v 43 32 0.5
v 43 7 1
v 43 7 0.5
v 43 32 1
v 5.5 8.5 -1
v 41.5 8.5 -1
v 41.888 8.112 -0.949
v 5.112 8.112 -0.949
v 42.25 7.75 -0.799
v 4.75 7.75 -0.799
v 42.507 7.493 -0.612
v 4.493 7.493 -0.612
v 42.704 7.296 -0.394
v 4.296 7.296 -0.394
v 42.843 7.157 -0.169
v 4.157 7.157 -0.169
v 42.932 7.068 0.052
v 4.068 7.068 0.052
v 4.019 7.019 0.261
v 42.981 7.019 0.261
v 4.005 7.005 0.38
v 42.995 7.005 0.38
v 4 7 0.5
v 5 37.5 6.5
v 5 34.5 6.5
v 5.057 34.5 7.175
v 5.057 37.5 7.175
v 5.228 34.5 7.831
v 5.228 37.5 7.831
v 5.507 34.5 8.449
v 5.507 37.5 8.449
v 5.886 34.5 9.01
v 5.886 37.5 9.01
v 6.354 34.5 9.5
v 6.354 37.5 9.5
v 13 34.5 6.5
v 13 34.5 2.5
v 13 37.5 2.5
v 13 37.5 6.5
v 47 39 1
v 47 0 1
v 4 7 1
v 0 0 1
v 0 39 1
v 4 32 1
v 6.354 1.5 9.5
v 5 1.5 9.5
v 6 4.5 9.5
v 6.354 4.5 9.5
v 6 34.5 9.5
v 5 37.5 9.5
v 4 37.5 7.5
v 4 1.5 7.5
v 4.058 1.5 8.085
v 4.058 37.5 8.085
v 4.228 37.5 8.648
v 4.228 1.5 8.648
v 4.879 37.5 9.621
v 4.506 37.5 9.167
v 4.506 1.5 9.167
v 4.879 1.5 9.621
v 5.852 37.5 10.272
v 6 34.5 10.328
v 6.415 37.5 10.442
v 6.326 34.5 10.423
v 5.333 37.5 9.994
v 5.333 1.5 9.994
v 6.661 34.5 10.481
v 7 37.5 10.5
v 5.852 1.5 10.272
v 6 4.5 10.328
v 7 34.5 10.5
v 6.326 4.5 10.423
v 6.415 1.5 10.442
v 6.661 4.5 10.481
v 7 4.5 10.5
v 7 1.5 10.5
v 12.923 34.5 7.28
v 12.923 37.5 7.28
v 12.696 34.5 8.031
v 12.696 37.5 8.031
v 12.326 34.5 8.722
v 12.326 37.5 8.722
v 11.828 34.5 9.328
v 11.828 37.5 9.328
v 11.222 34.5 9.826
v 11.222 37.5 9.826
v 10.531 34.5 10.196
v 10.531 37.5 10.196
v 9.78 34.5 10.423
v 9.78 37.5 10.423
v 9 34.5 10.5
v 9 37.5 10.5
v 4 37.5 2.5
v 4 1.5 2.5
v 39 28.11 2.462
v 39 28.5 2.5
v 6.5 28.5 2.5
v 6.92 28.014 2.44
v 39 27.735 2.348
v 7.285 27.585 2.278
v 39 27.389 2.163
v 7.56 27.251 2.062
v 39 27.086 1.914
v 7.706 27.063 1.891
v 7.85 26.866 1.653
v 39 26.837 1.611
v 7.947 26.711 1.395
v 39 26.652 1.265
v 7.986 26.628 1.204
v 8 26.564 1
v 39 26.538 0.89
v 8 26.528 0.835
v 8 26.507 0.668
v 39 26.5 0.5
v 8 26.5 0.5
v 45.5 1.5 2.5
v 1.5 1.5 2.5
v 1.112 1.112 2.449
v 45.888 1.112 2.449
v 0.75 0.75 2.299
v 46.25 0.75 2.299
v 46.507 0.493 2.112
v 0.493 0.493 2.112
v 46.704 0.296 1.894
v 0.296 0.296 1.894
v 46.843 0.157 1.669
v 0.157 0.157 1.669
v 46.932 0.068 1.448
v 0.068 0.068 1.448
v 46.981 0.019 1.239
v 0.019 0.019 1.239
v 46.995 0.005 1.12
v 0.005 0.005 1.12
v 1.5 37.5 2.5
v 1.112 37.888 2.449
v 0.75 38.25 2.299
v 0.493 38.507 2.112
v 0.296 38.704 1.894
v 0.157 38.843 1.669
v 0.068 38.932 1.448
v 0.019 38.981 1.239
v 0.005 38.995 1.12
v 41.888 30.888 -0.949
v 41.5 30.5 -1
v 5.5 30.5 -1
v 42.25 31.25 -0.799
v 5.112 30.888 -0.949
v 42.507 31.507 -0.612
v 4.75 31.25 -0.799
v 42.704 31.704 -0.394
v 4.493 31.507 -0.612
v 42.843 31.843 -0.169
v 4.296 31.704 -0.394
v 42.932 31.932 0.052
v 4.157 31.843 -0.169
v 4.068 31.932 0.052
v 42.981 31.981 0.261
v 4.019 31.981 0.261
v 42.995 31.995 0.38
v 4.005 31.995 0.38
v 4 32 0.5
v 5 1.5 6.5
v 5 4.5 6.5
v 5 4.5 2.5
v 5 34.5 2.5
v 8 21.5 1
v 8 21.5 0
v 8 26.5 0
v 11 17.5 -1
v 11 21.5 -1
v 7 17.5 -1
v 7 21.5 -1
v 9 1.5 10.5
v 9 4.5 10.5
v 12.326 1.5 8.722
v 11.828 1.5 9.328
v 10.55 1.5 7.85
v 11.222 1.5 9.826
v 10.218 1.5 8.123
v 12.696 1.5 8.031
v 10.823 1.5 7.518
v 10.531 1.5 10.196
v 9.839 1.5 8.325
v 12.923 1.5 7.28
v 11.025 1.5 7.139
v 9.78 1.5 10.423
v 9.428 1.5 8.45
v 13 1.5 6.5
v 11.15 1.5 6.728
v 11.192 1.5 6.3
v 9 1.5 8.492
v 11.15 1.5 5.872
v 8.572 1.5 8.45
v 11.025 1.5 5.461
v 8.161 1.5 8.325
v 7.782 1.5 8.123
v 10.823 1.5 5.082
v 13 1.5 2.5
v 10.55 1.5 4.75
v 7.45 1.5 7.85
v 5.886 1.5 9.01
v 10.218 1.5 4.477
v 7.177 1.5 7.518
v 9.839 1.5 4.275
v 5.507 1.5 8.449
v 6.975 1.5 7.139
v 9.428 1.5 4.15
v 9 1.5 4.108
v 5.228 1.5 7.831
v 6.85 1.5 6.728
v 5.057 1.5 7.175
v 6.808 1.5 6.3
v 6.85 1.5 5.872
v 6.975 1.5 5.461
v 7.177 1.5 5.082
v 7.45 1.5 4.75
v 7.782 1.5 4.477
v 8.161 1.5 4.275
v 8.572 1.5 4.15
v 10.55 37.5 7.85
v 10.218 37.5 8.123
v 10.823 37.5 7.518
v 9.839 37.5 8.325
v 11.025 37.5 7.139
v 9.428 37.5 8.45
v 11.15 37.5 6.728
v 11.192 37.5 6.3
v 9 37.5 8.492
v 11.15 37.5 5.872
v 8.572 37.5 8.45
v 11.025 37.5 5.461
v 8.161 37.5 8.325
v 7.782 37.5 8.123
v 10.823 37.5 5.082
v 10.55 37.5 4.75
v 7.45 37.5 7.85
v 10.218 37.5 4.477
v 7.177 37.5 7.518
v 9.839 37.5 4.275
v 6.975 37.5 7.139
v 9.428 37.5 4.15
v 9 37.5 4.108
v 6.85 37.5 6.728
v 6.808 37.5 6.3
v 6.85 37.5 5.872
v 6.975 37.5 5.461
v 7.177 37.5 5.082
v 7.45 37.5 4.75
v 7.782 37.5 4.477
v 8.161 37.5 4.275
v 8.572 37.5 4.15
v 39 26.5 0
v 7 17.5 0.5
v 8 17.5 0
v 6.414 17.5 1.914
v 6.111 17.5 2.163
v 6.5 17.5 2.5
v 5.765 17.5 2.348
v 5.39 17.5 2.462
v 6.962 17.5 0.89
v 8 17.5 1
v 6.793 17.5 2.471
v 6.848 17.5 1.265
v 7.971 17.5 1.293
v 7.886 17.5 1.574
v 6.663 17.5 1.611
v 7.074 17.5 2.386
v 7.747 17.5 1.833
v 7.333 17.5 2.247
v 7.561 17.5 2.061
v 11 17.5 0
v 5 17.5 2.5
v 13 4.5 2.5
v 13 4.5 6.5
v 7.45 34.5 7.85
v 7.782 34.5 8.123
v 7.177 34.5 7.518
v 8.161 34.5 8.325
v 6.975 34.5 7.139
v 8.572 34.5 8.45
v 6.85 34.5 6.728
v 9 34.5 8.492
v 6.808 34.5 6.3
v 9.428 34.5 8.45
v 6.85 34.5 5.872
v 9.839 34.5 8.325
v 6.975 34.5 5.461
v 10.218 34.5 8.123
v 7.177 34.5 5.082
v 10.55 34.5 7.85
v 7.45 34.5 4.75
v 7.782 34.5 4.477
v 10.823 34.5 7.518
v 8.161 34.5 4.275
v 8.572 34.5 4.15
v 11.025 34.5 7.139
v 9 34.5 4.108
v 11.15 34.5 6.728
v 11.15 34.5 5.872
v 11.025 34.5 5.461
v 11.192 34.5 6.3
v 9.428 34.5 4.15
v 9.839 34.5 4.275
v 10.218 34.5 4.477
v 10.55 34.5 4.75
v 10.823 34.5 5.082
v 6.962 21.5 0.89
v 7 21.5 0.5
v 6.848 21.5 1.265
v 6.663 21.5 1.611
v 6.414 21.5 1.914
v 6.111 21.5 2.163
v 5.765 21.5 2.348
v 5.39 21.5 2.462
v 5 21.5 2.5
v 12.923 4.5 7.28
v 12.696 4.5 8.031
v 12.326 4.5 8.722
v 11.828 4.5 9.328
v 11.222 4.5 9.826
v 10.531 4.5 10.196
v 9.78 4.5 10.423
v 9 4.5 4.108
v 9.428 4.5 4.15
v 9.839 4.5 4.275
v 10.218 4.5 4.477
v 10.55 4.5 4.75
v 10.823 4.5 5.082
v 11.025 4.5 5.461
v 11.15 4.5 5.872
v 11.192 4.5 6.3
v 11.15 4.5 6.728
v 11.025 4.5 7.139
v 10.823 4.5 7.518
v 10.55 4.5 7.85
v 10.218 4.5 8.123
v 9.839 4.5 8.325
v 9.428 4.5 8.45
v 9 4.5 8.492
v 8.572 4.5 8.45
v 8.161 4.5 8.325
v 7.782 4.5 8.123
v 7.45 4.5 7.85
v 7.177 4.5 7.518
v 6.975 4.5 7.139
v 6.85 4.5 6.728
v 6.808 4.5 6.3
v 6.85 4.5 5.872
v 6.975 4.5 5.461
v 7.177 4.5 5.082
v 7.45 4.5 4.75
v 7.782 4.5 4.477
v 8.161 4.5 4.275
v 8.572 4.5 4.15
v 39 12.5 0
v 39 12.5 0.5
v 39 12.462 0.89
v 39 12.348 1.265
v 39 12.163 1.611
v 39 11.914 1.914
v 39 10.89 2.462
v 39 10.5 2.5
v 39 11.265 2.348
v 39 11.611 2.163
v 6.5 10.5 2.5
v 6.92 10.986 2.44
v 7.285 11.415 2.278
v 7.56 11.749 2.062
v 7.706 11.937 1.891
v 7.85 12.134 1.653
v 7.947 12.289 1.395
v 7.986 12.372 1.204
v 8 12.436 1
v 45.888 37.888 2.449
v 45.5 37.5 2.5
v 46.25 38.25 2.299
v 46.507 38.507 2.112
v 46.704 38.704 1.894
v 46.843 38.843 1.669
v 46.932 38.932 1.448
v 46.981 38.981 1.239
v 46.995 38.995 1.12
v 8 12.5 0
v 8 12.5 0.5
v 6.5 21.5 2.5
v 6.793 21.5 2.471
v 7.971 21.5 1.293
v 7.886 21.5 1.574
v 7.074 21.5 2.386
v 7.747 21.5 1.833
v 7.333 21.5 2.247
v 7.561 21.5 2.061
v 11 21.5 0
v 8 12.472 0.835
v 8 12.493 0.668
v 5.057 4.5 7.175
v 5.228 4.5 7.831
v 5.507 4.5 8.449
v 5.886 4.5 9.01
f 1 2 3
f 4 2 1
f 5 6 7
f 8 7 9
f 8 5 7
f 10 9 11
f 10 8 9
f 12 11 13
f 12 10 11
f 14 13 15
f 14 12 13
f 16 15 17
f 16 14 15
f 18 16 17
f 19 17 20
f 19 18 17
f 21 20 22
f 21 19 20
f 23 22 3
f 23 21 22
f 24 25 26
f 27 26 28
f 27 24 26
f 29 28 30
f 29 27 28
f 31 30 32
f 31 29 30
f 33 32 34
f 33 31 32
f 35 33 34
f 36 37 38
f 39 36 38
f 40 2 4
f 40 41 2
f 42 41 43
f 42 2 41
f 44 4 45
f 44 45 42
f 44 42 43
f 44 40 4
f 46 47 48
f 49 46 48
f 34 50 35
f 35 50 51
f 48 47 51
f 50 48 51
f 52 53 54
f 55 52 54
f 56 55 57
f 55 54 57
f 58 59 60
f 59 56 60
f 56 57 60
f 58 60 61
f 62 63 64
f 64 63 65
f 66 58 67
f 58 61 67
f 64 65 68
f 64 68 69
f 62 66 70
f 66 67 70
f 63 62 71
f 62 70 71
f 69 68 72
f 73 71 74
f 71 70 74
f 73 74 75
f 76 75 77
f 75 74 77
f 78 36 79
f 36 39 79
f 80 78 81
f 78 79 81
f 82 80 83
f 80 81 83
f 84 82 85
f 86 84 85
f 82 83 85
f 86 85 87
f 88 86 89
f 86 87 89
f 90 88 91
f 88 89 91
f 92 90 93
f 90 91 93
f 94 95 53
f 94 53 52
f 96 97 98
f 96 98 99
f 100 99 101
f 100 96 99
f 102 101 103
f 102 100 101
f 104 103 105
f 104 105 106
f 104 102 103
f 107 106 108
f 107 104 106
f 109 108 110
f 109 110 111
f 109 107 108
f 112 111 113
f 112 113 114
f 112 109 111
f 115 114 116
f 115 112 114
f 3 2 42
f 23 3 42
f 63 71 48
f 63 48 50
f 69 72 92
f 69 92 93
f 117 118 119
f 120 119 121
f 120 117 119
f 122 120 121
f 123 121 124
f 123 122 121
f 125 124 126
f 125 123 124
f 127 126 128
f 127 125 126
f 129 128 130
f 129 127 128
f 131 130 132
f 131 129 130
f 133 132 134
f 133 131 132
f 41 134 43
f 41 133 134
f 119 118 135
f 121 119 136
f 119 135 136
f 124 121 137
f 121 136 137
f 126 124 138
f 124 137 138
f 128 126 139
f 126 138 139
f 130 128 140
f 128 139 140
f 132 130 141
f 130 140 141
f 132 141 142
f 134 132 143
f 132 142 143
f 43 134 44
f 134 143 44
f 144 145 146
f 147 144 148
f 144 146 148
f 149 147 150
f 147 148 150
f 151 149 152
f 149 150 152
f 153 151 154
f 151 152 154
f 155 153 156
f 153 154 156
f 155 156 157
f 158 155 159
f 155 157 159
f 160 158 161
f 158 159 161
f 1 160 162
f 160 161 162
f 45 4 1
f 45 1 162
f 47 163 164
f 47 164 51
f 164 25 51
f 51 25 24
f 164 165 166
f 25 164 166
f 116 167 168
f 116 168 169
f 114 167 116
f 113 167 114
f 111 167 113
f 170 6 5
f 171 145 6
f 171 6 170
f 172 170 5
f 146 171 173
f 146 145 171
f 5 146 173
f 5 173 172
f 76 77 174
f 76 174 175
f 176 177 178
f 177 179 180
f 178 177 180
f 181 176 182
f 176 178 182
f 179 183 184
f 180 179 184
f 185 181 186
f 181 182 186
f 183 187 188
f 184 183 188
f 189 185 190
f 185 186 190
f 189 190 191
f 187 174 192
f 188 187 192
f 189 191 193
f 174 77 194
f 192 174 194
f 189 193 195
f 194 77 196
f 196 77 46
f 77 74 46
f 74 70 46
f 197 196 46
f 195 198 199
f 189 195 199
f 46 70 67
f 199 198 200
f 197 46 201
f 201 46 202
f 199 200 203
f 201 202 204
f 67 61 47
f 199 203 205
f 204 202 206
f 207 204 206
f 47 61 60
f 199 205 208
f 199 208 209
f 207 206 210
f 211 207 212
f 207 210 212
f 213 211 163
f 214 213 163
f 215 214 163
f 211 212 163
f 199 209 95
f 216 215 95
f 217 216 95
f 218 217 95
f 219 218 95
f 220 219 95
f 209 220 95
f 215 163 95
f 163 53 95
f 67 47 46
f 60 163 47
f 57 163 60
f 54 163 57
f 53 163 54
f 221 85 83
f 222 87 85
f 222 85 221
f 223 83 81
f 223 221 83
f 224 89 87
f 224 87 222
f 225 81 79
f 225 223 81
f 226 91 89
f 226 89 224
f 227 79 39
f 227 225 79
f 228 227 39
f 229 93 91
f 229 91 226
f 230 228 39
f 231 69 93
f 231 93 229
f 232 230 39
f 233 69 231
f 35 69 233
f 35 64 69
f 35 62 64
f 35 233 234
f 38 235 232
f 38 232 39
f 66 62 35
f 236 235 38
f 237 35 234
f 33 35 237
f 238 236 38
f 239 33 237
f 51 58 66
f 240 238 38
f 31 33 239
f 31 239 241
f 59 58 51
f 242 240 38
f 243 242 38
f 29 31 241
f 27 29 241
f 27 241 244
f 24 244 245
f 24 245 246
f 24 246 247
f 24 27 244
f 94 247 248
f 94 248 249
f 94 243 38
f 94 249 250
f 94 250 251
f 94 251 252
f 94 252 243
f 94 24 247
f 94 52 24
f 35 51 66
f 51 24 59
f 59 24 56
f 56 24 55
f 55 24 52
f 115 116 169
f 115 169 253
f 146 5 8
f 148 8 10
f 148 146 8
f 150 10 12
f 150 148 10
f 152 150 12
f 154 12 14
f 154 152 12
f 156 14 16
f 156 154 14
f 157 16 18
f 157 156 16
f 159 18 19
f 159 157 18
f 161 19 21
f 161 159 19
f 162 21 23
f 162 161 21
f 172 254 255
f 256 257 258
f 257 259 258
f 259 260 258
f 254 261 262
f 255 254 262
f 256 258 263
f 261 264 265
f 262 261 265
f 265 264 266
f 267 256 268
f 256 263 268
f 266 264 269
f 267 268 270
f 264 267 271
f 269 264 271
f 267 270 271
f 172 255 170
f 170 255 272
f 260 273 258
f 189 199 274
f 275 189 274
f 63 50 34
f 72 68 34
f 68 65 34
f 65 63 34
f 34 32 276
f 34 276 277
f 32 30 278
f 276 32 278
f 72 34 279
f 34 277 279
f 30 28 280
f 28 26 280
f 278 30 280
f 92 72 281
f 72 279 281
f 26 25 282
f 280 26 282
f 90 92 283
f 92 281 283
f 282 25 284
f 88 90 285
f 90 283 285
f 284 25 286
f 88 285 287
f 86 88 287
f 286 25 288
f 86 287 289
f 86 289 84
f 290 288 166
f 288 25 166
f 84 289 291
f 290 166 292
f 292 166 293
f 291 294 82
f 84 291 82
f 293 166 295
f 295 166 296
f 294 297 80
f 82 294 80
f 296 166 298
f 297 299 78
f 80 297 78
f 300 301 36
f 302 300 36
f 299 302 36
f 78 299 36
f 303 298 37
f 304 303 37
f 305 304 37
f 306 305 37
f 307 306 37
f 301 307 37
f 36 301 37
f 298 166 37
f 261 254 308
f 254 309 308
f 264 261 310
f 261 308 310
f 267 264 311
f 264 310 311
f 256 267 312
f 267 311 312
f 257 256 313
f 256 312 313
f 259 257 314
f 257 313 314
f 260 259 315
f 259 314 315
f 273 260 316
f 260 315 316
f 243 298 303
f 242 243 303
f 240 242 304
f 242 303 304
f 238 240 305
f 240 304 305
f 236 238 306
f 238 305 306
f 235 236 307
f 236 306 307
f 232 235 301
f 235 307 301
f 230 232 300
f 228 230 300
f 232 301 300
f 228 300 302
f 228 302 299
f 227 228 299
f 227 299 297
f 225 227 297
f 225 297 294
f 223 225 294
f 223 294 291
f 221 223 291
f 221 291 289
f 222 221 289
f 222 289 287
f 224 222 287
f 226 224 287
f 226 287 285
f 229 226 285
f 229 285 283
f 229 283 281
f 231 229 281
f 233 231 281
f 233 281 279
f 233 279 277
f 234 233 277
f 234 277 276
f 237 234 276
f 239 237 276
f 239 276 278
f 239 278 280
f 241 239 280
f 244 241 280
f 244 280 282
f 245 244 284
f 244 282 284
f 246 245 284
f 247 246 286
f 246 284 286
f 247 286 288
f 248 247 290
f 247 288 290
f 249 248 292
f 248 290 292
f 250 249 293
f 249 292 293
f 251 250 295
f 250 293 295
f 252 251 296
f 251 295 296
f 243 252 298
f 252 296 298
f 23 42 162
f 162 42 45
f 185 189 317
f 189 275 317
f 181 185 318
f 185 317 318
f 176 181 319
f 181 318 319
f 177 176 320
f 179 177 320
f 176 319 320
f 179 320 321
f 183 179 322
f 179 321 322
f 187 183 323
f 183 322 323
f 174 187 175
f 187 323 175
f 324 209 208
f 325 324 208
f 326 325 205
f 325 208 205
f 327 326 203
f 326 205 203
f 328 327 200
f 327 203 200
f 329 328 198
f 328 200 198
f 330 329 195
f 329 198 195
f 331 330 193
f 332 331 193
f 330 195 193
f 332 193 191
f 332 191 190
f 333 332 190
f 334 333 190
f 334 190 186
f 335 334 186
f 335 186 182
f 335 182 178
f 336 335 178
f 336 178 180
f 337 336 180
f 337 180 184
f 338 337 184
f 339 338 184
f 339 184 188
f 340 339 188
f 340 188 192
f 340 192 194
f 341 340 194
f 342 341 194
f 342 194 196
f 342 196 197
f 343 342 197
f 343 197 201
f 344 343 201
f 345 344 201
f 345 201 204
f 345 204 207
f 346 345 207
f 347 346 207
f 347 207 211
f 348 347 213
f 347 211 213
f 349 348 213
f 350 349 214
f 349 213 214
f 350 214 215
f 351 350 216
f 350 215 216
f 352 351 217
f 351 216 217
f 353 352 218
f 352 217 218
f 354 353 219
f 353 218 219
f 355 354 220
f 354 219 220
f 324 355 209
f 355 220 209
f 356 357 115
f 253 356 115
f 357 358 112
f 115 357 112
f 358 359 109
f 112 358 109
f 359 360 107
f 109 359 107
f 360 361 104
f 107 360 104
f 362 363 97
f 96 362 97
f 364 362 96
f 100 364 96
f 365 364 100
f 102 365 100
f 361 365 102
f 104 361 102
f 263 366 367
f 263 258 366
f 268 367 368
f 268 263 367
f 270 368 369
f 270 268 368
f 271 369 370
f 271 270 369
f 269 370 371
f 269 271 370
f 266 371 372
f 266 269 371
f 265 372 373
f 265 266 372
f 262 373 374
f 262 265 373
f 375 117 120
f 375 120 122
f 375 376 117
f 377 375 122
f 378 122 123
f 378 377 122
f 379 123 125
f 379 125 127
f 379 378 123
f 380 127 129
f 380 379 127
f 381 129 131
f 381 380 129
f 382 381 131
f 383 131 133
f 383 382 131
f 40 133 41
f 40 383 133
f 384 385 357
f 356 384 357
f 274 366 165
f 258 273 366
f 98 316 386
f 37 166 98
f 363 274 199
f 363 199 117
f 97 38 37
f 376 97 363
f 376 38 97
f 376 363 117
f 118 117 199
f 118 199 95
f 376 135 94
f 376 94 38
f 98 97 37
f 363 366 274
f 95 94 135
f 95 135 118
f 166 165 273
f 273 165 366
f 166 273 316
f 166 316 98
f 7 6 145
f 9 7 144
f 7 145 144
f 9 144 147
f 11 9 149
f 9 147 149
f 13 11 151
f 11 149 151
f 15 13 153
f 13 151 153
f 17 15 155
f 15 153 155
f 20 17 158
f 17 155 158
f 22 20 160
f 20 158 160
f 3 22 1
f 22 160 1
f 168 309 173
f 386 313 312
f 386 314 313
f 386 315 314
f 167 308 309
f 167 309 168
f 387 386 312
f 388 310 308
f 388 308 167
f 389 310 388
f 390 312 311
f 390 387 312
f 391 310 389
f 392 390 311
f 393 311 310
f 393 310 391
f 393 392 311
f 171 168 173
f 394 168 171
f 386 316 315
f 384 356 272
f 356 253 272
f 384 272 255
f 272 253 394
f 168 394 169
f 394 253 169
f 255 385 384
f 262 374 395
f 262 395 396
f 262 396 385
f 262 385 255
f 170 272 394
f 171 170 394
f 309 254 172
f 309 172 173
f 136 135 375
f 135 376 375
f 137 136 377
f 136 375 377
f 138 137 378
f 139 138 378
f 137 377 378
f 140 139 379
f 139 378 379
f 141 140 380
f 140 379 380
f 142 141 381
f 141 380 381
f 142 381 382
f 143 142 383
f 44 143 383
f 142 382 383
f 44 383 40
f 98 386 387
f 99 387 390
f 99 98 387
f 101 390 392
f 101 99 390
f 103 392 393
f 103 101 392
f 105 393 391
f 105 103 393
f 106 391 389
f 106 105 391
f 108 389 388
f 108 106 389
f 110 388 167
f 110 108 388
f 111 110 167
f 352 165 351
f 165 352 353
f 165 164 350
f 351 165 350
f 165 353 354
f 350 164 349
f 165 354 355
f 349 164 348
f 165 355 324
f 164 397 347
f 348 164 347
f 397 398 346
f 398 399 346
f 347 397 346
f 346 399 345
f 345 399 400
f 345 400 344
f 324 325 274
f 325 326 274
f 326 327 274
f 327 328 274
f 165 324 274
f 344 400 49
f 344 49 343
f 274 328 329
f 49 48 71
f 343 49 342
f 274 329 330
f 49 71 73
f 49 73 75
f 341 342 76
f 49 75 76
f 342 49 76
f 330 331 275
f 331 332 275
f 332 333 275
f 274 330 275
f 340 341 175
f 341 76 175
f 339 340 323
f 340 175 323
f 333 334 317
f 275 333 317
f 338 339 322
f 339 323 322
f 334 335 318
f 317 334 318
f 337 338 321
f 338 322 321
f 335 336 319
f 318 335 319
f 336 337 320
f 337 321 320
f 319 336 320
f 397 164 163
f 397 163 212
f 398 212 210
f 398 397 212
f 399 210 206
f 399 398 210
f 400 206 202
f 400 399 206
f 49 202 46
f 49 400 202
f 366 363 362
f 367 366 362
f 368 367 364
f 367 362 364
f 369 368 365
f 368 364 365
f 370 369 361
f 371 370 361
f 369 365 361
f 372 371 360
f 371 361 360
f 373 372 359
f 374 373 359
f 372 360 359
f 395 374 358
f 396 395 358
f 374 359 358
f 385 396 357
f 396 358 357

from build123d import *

# Parameters (mm, degrees)
ESQUISSE1_W             = 47
ESQUISSE1_H             = 39
BOSS_EXTRU_1_DEPTH      = 2.5
ESQUISSE2_W             = 8
ESQUISSE2_H             = 3
BOSS_EXTRU_2_DEPTH      = 8
ESQUISSE3_R             = 2.192012696
ENL_V_MAT_EXTRU_1_DEPTH = 62.036874101
CONG_1_R                = 4
ESQUISSE4_W             = 31
ESQUISSE4_H             = 14
ENL_V_MAT_EXTRU_2_DEPTH = 20
CONG_2_R                = 2
ESQUISSE8_W             = 1
ESQUISSE8_H             = 36
BOSS_EXTRU_5_DEPTH      = 8
ESQUISSE9_W             = 1
ESQUISSE9_H             = 36
BOSS_EXTRU_6_DEPTH      = 4
ESQUISSE10_W            = 7.449336574
ESQUISSE10_H            = 30
ENL_V_MAT_EXTRU_4_DEPTH = 8
CONG_4_R                = 3
ESQUISSE11_OUTSIDE_W    = 61.394
ESQUISSE11_OUTSIDE_H    = 53.394
ESQUISSE11_OUTSIDE_W_2  = 39
ESQUISSE11_OUTSIDE_H_2  = 25
ENL_V_MAT_EXTRU_5_DEPTH = 1
ESQUISSE12_W            = 39
ESQUISSE12_H            = 25
BOSS_EXTRU_7_DEPTH      = 1
ENL_V_MAT_EXTRU_6_REACH = 63.595
ESQUISSE13_W            = 4
ESQUISSE13_H            = 4
CONG_6_R                = 2
CONG_7_R                = 1.5
CONG_8_R                = 1.5


# Some blends are built 0.0001 mm under size
with BuildPart() as part:
    # Esquisse1 → Boss.-Extru.1 (new body)
    with BuildSketch(Plane.XY):
        with Locations((23.5, 19.5)):
            Rectangle(ESQUISSE1_W, ESQUISSE1_H)
    extrude(amount=BOSS_EXTRU_1_DEPTH)

    # Esquisse2 → Boss.-Extru.2 (add)
    with BuildSketch(Plane.XY.offset(2.5)):
        with Locations((9, 36)):
            Rectangle(ESQUISSE2_W, ESQUISSE2_H)
        with Locations((9, 3)):
            Rectangle(ESQUISSE2_W, ESQUISSE2_H)
    extrude(amount=BOSS_EXTRU_2_DEPTH)

    # Esquisse3 → Enlèv. mat.-Extru.1 (cut, through all)
    with BuildSketch(Plane.XZ.offset(-1.5)):
        with Locations(Location((9, 6.3, 0), (0, 0, 270))):
            Circle(ESQUISSE3_R)
    extrude(amount=-ENL_V_MAT_EXTRU_1_DEPTH, mode=Mode.SUBTRACT)

    # Congé1
    cong_1_edges = [part.edges().sort_by_distance(p)[0] for p in [
        (13, 3, 10.5),
        (5, 3, 10.5),
        (13, 36, 10.5),
        (5, 36, 10.5),
    ]]
    fillet(cong_1_edges, radius=CONG_1_R - 0.0001)  # a hair under: the kernel refuses the full size

    # Esquisse4 → Enlèv. mat.-Extru.2 (cut)
    with BuildSketch(Plane.XY.offset(2.5)):
        with Locations((23.5, 19.5)):
            Rectangle(ESQUISSE4_W, ESQUISSE4_H)
    extrude(amount=-ENL_V_MAT_EXTRU_2_DEPTH, mode=Mode.SUBTRACT)

    # Congé2
    cong_2_edges = [part.edges().sort_by_distance(p)[0] for p in [
        (23.5, 12.5, 2.5),
        (23.5, 26.5, 2.5),
    ]]
    fillet(cong_2_edges, radius=CONG_2_R)

    # Esquisse8 → Boss.-Extru.5 (add)
    with BuildSketch(Plane.XY.offset(2.5)):
        with Locations((4.5, 19.5)):
            Rectangle(ESQUISSE8_W, ESQUISSE8_H)
    extrude(amount=BOSS_EXTRU_5_DEPTH)

    # Esquisse9 → Boss.-Extru.6 (add)
    with BuildSketch(Plane(origin=(5, 0, 0), x_dir=(0, 0, -1), z_dir=(1, 0, 0))):
        with Locations((-10, 19.5)):
            Rectangle(ESQUISSE9_W, ESQUISSE9_H)
    extrude(amount=BOSS_EXTRU_6_DEPTH)

    # Esquisse10 → Enlèv. mat.-Extru.4 (cut)
    with BuildSketch(Plane.XY.offset(10.5)):
        with Locations((9.724668287, 19.5)):
            Rectangle(ESQUISSE10_W, ESQUISSE10_H)
    extrude(amount=-ENL_V_MAT_EXTRU_4_DEPTH, mode=Mode.SUBTRACT)

    # Congé4
    # the kernel refuses this fillet: 3 mm, written as the material it takes off along each edge
    with BuildSketch(Plane(origin=(4, -6, 10.5), x_dir=(1, 0, 0), z_dir=(0, 1, 0))) as cong_4_piece_1:
        with BuildLine():
            CenterArc((CONG_4_R, CONG_4_R), CONG_4_R, 180, 90)
            Line((0, CONG_4_R), (0, 0))
            Line((0, 0), (CONG_4_R, 0))
        make_face()
    extrude(amount=51, mode=Mode.SUBTRACT)

    # Esquisse11 outside → Enlèv. mat.-Extru.5 (cut)
    with BuildSketch(Plane(origin=(0, 0, 0), x_dir=(-1, 0, 0), z_dir=(0, 0, -1))):
        with Locations((-23.5, 19.5)):
            Rectangle(ESQUISSE11_OUTSIDE_W, ESQUISSE11_OUTSIDE_H)
        with Locations((-23.5, 19.5)):
            Rectangle(ESQUISSE11_OUTSIDE_W_2, ESQUISSE11_OUTSIDE_H_2, mode=Mode.SUBTRACT)
    extrude(amount=-ENL_V_MAT_EXTRU_5_DEPTH, mode=Mode.SUBTRACT)

    # Esquisse12 → Boss.-Extru.7 (add)
    with BuildSketch(Plane(origin=(0, 0, 0), x_dir=(-1, 0, 0), z_dir=(0, 0, -1))):
        with Locations((-23.5, 19.5)):
            Rectangle(ESQUISSE12_W, ESQUISSE12_H)
    extrude(amount=BOSS_EXTRU_7_DEPTH)

    # Esquisse13 → Enlèv. mat.-Extru.6 (cut, up to next)
    with BuildSketch(Plane.XY.offset(2.5), mode=Mode.PRIVATE) as enl_v_mat_extru_6_sk1:
        with Locations((9, 19.5)):
            Rectangle(ESQUISSE13_W, ESQUISSE13_H)
    enl_v_mat_extru_6_tool1 = extrude(enl_v_mat_extru_6_sk1.sketch, amount=-ENL_V_MAT_EXTRU_6_REACH, mode=Mode.PRIVATE) & part.part
    add(enl_v_mat_extru_6_tool1.solids().sort_by_distance((9, 19.5, 2.5))[0], mode=Mode.SUBTRACT)

    # Congé6
    cong_6_edges = [part.edges().sort_by_distance(p)[0] for p in [
        (7, 19.5, 2.5),
    ]]
    fillet(cong_6_edges, radius=CONG_6_R - 0.0001)  # a hair under: the kernel refuses the full size

    # Congé7
    cong_7_edges = [part.edges().sort_by_distance(p)[0] for p in [
        (8, 25, 2.5),
        (8, 14, 2.5),
        (0, 19.5, 2.5),
        (23.5, 0, 2.5),
        (47, 19.5, 2.5),
        (23.5, 39, 2.5),
    ]]
    fillet(cong_7_edges, radius=CONG_7_R - 0.0001)  # a hair under: the kernel refuses the full size

    # Congé8
    cong_8_edges = [part.edges().sort_by_distance(p)[0] for p in [
        (43, 19.5, -1),
        (23.5, 7, -1),
        (4, 19.5, -1),
        (23.5, 32, -1),
    ]]
    fillet(cong_8_edges, radius=CONG_8_R)


solid = part.part
